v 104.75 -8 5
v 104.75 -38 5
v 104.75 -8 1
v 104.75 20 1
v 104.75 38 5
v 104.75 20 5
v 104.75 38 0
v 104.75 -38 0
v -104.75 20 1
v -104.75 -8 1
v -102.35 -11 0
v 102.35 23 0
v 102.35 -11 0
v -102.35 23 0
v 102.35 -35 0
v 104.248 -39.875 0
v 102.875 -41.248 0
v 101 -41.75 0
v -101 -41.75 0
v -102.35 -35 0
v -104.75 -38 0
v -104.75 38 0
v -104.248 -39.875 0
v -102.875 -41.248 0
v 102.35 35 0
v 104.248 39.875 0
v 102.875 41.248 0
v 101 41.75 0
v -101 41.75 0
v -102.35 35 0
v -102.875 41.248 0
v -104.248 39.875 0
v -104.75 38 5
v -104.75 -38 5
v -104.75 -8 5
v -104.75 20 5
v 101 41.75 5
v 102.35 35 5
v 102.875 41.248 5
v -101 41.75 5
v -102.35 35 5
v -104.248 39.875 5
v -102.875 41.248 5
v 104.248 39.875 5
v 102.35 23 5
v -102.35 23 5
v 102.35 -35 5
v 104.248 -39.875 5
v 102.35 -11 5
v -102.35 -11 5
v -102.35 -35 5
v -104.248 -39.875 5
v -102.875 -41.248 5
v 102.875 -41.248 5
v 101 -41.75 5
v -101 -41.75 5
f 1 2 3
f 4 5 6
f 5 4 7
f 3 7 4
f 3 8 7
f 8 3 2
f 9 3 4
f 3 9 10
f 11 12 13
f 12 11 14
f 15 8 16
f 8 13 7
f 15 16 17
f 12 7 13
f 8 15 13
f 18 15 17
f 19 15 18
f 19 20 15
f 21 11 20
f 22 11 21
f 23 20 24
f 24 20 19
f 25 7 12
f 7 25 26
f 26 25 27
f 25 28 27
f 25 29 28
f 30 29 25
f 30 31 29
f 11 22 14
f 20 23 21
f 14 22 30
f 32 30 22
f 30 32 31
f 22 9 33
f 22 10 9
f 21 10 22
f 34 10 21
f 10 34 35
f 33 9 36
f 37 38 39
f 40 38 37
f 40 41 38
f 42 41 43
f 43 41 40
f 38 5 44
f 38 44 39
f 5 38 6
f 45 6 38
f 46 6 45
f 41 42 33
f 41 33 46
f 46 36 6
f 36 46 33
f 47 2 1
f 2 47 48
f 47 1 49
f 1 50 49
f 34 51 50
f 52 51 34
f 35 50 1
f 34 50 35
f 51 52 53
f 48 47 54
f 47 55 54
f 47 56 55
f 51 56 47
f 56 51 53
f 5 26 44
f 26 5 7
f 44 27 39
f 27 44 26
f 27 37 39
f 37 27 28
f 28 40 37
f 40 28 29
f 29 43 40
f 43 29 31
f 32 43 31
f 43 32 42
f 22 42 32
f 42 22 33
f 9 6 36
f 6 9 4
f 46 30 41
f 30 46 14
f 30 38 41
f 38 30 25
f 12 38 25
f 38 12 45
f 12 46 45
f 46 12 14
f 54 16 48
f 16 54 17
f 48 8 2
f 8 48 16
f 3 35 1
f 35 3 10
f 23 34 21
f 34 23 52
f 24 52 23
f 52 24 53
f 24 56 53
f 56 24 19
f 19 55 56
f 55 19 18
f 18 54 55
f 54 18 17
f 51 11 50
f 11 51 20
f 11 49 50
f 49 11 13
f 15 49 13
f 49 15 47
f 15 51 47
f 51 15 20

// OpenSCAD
// file: ../fixture_rack_common.scad
// fixture_rack_common — 5×2 Gridfinity storage rack for three repair fixtures, standing
// on edge like books. Storage, not use: the user's own sketch (2026-10-25).
//
// MEASURED BY THE USER (survey/MEASUREMENTS.md, 2026-10-25):
//   AMAOE M81 heat mat   190 × 245 × 8    on its 190 edge, 245 tall
//   RELIFE RL-605 Pro    179 × 210 × 24   on its 210 edge, 179 tall; knobs on both
//                                         ends about halfway up
//   RELIFE TF5           60 × 182 × 20    on its 182 edge (knobs included), 60 tall
//
// THE RL-605's SLOT HAS NO END WALLS. Five cells is 209.5 outside but ~207 inside
// the end walls, and the RL-605 is 210 long — so its slot runs straight out both
// ends, the plate sits across the whole length, and its knobs hang over the ends
// well above the rim (user's call). The other two fit inside walled slots.
//
// STEPPED, AS SKETCHED: the back section (mat, RL-605) stands BACK_H; the front
// section (TF5) steps down to FRONT_H so a hand gets in.
//
// PRINT: as emitted, feet down. No supports.
//
// SPDX-License-Identifier: CC-BY-NC-4.0
// Copyright (c) 2026 Aaron Cupp

include <../lib/gridfinity.scad>

/* [Pieces — measured] */
// [name, standing length (on the floor), thickness]
MAT = [190, 8];
RL  = [210, 24];
TF5 = [182, 20];

/* [Rack] */
NX = 5; NY = 2;
CLR      = 4;      // added to each thickness — slots this much wider than the piece
WALL     = 2.4;    // outer walls
DIV      = 3.0;    // dividers — the RL-605 is the heavy one and leans on them
FLOOR    = 2.0;
BACK_H   = 60;     // above the floor: mat + RL-605, a third of the RL-605's 179
FRONT_H  = 30;     // TF5 section: half its 60 mm height

W = NX*GF - 0.5;  D = NY*GF - 0.5;
Z0 = BIN_BASE_H + FLOOR;
IN_X = W - 2*WALL;                       // inside the end walls

slots = [MAT[1] + CLR, RL[1] + CLR, TF5[1] + CLR];   // back → front
used  = slots[0] + slots[1] + slots[2] + 2*DIV;
y_back = D/2 - (D - used)/2;            // centre the group; outer walls take the rest
// back edge of each slot, going toward the front (−Y)
function y_top(i) = y_back - (i == 0 ? 0 : i == 1 ? slots[0] + DIV : slots[0] + slots[1] + 2*DIV);
step_y = y_top(2) + DIV/2;              // the step sits over the RL/TF5 divider's middle

assert(MAT[0] <= IN_X && TF5[0] <= IN_X, "Mat or TF5 longer than the walled slot.");
assert(RL[0] > IN_X, "RL-605 now fits inside end walls — give its slot end walls back.");
assert((D - used)/2 >= WALL, "Slots don't fit across two cells.");
echo(str("rack ", W, " × ", D, "; slots (back→front) ", slots, "; outer walls ", (D - used)/2,
         "; back ", Z0 + BACK_H, " tall, front ", Z0 + FRONT_H));

module slot(i, open_ends) {
    l = open_ends ? W + 2 : IN_X;
    translate([-l/2, y_top(i) - slots[i], Z0]) cube([l, slots[i], BACK_H + 1]);
}

module rack() {
    difference() {
        bin_blank(NX, NY, Z0 + BACK_H);
        slot(0, false);   // heat mat
        slot(1, true);    // RL-605: open both ends
        slot(2, false);   // TF5
        // the step: everything in front of it comes down to FRONT_H
        translate([-W, -D, Z0 + FRONT_H]) cube([2*W, step_y + D, BACK_H]);
    }
}

// LAYOUT COUPON: the rack's exact top-view outline — outer walls, dividers, end
// walls, the RL-605's open ends — at full length but only FRAME_H tall, with no
// floor and no feet. Lay each fixture in its slot to check length AND thickness
// for ~25 g instead of the whole rack.
FRAME_H = 5;
TIE_T   = 1;   // floor strip under the RL-605 slot only. Its open ends would
               // otherwise cut the frame into two loose halves; the rack's own
               // floor does this job. It runs 1 mm under each divider, a
               // partial-area join, so it overlaps rather than butts.
module layout_coupon() {
    translate([-W/2, y_top(1) - slots[1] - 1, 0]) cube([W, slots[1] + 2, TIE_T]);
    linear_extrude(FRAME_H) difference() {
        offset(r = BIN_R) offset(delta = -BIN_R) square([W, D], center = true);
        for (i = [0:2]) {
            l = (i == 1) ? W + 2 : IN_X;     // RL-605 runs out both ends
            translate([-l/2, y_top(i) - slots[i]]) square([l, slots[i]]);
        }
    }
}
// main file
// layout_fit_coupon — print first. The fixture rack's exact top-view layout at
// full length, 5 mm tall, no floor, no feet: every wall and divider where the
// rack puts them, for ~25 g.
//
// Lay each fixture on its edge in its slot. Back to front: heat mat (narrowest
// slot), RL-605 (widest — open at both ends, its knobs hang out over them), TF5.
// Want: the mat and TF5 fit between the end walls; every piece drops in by hand
// with a little side play. Too tight or too loose → change CLR in
// fixture_rack_common.scad and the rack follows.
//
// PRINT: flat as emitted, no supports.
//
// SPDX-License-Identifier: CC-BY-NC-4.0
// Copyright (c) 2026 Aaron Cupp
include <../fixture_rack_common.scad>
layout_coupon();
